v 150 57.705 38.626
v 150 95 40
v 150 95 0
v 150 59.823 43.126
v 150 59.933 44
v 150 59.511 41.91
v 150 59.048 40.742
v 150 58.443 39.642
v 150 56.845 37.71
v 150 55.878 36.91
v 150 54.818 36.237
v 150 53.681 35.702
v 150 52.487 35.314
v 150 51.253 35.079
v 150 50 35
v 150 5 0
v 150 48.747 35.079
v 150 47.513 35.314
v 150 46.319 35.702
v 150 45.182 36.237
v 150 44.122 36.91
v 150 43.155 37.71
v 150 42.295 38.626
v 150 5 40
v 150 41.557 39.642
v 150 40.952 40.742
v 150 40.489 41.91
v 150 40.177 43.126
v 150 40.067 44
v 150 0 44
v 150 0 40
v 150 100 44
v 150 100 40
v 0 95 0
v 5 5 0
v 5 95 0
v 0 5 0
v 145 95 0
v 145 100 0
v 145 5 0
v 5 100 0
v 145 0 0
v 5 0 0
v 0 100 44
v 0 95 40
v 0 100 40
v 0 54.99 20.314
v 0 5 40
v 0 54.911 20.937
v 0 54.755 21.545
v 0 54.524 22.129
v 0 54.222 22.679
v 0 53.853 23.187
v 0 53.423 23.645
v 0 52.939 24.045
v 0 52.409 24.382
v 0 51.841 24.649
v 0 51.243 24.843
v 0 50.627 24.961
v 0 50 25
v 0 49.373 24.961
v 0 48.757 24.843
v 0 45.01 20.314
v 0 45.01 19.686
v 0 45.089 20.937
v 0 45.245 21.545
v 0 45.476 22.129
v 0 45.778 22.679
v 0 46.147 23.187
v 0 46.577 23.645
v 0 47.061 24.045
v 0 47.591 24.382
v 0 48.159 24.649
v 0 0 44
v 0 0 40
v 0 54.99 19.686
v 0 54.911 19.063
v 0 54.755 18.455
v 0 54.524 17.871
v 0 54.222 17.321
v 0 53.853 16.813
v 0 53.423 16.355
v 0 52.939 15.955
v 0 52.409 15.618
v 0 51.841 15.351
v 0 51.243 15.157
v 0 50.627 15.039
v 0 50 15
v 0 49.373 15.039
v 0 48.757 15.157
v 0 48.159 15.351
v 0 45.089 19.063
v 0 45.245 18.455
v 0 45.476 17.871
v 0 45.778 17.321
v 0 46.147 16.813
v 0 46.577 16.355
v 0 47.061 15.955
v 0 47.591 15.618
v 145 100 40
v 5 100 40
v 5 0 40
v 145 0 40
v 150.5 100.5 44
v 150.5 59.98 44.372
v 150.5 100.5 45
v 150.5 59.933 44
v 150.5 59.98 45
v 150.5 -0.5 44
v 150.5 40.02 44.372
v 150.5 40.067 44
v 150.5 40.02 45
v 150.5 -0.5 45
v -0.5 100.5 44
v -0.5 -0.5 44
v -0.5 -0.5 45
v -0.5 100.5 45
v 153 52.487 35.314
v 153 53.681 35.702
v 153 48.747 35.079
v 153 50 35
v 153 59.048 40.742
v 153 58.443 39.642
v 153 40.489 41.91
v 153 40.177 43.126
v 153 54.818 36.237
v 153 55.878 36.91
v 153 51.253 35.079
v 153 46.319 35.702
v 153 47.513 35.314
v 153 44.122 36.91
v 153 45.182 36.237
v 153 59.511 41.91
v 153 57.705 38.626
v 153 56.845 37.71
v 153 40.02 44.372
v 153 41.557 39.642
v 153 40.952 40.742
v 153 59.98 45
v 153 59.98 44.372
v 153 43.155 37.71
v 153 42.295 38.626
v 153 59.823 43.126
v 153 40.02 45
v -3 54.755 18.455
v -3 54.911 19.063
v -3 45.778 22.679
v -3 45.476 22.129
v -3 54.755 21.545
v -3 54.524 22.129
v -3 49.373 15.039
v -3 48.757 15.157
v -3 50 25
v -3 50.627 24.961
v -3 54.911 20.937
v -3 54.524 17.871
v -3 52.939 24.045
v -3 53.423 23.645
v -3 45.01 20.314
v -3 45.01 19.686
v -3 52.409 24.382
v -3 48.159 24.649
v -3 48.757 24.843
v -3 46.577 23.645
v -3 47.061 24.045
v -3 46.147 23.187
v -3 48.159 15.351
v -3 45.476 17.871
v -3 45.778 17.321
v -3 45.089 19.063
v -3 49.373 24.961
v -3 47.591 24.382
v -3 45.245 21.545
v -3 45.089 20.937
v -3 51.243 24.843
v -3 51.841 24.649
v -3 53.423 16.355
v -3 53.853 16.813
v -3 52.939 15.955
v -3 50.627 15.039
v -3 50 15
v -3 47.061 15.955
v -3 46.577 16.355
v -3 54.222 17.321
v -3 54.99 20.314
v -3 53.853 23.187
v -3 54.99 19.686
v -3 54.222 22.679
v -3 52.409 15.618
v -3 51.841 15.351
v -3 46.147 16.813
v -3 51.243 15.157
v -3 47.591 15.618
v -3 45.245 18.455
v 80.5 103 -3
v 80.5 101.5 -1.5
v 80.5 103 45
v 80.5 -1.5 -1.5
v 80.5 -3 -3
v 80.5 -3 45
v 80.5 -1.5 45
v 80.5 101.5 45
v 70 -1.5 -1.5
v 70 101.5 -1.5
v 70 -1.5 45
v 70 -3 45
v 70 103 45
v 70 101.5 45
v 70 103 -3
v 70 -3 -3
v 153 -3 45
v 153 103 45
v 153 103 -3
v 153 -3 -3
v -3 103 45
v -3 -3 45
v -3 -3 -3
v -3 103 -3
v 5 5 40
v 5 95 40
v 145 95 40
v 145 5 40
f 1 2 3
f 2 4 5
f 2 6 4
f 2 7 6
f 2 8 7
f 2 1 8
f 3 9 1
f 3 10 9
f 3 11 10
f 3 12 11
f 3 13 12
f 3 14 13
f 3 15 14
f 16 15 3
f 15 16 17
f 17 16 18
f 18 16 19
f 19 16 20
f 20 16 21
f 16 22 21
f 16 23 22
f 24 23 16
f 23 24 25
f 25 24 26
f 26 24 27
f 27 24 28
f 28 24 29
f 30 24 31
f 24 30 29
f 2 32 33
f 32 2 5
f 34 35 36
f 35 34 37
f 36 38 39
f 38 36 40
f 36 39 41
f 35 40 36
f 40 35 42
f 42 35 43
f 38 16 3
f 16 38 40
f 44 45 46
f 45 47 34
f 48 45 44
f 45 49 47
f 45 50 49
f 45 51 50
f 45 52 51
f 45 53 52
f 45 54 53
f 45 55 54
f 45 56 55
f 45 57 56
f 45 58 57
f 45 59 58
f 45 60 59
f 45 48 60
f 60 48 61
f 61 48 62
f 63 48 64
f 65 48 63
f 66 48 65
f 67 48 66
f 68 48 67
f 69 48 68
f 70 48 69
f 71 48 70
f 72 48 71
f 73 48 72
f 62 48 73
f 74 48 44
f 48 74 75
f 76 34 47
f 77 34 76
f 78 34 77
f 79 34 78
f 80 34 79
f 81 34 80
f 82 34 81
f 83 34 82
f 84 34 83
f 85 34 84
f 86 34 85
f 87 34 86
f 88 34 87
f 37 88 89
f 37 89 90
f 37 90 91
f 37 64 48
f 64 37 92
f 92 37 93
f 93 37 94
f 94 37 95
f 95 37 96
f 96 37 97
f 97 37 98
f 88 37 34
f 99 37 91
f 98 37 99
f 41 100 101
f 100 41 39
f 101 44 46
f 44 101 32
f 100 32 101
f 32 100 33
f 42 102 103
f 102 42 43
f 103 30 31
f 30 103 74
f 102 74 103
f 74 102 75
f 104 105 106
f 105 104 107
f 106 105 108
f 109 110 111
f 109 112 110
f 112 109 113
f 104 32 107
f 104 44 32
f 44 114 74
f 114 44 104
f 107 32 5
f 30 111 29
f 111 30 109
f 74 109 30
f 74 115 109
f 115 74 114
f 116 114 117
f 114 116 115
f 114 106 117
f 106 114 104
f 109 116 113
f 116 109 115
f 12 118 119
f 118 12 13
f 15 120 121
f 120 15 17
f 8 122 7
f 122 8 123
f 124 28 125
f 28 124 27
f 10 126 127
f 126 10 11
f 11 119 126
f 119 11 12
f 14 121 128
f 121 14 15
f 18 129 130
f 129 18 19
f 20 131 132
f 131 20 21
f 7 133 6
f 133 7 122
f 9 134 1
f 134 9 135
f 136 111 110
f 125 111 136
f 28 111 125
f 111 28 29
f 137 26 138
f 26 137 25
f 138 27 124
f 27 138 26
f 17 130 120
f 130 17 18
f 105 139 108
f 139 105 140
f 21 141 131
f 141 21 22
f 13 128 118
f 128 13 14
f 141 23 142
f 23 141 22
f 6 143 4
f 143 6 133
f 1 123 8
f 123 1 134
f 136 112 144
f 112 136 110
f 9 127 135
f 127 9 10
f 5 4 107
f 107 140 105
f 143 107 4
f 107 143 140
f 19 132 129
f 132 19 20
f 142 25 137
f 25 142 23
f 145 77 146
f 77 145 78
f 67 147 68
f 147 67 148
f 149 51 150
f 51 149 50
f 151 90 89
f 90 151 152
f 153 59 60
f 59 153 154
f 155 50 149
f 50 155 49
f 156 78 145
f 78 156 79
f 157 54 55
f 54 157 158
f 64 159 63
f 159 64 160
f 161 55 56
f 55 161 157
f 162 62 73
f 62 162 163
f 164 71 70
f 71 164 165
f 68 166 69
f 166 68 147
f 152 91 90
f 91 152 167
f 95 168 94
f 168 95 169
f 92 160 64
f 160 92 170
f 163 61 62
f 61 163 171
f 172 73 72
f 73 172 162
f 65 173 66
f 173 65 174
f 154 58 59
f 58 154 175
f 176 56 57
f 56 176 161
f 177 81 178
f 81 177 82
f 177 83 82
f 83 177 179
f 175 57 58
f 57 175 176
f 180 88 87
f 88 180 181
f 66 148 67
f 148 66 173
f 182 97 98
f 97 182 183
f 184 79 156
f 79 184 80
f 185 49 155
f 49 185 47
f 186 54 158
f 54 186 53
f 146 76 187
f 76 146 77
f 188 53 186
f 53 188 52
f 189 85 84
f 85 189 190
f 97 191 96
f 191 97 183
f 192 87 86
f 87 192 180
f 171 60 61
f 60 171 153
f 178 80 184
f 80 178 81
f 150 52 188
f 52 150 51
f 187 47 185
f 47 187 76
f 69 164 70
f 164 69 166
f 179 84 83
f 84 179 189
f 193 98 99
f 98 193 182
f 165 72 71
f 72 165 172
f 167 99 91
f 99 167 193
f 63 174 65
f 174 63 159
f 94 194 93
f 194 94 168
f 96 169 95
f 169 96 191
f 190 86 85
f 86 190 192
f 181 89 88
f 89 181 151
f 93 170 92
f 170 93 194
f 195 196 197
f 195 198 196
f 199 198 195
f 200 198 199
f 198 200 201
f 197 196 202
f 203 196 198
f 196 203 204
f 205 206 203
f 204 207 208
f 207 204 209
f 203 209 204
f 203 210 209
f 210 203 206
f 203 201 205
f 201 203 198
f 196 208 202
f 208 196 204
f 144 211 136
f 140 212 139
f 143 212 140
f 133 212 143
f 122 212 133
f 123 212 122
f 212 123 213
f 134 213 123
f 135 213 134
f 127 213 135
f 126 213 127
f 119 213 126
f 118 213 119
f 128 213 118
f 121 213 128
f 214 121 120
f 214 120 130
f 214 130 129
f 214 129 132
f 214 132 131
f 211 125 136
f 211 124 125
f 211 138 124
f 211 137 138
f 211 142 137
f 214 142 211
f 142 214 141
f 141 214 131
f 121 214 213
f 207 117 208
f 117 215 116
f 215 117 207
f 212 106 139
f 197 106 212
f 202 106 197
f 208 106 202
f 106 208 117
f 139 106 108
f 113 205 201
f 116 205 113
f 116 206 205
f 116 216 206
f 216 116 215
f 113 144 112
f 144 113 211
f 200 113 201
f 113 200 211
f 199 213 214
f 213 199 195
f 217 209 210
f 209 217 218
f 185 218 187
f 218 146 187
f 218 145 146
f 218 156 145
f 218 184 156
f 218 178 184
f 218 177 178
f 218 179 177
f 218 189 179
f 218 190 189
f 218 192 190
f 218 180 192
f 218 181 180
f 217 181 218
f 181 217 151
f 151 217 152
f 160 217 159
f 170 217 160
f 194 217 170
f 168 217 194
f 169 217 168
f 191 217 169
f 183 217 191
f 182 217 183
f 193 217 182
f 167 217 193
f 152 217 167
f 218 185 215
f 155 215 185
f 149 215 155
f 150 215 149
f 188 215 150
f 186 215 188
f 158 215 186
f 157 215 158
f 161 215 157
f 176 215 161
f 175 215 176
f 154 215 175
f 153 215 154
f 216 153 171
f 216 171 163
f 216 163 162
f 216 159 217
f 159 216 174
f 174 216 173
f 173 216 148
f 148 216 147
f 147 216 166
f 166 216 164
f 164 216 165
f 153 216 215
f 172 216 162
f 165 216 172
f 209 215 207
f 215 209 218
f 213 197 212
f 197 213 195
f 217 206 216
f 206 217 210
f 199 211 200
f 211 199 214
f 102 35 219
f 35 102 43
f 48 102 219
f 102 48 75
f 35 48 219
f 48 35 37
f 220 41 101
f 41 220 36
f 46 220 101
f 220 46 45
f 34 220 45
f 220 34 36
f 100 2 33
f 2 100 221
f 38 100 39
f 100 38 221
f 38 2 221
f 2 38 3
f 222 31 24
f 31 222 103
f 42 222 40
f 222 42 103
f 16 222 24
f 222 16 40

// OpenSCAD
// the inner case is 100 x 150 mm
$fn=50;

module clip() {
	translate([0, -3, -3]) difference() {
		cube([10, 106, 45+3+1.5+0.5]);
		translate([-1, 1.5-0.25, 1.5]) cube([20, 103 + 0.5, 45+1.5+0.5]);
		translate([-1, 1.5+ 6, 20]) cube([20, 90, 50]);
	}
	
}

module case_bottom() {
	difference() {
		translate([-3, -3, -3]) cube([150+6, 100+6, 45+3]);
		union() {
			cube([150, 100, 500]);
			translate([-0.5, -0.5, 44]) cube([151, 101, 50]);
			translate([10, 100/2, 45]) rotate([0, 90, 0]) cylinder(d=20, h=500);
			translate([10, 100/2, 20]) rotate([0, -90, 0]) cylinder(d=10, h=500);
			translate([75-5, -30, -3-1]) cube([10.5, 200, 1.5+1]);
			translate([75-5, -3-1, -10]) cube([10.5, 1.5+1, 200]);
			translate([75-5, 103-1.5, -10]) cube([10.5, 1.5+1, 200]);
		}
	}
	cube([5, 5, 45-5]);
	translate([0, 100-5]) cube([5, 5, 45-5]);
	translate([150-5, 100-5]) cube([5, 5, 45-5]);
	translate([150-5, 0]) cube([5, 5, 45-5]);
}

case_bottom();
// translate([-30, 0, 0]) clip();
